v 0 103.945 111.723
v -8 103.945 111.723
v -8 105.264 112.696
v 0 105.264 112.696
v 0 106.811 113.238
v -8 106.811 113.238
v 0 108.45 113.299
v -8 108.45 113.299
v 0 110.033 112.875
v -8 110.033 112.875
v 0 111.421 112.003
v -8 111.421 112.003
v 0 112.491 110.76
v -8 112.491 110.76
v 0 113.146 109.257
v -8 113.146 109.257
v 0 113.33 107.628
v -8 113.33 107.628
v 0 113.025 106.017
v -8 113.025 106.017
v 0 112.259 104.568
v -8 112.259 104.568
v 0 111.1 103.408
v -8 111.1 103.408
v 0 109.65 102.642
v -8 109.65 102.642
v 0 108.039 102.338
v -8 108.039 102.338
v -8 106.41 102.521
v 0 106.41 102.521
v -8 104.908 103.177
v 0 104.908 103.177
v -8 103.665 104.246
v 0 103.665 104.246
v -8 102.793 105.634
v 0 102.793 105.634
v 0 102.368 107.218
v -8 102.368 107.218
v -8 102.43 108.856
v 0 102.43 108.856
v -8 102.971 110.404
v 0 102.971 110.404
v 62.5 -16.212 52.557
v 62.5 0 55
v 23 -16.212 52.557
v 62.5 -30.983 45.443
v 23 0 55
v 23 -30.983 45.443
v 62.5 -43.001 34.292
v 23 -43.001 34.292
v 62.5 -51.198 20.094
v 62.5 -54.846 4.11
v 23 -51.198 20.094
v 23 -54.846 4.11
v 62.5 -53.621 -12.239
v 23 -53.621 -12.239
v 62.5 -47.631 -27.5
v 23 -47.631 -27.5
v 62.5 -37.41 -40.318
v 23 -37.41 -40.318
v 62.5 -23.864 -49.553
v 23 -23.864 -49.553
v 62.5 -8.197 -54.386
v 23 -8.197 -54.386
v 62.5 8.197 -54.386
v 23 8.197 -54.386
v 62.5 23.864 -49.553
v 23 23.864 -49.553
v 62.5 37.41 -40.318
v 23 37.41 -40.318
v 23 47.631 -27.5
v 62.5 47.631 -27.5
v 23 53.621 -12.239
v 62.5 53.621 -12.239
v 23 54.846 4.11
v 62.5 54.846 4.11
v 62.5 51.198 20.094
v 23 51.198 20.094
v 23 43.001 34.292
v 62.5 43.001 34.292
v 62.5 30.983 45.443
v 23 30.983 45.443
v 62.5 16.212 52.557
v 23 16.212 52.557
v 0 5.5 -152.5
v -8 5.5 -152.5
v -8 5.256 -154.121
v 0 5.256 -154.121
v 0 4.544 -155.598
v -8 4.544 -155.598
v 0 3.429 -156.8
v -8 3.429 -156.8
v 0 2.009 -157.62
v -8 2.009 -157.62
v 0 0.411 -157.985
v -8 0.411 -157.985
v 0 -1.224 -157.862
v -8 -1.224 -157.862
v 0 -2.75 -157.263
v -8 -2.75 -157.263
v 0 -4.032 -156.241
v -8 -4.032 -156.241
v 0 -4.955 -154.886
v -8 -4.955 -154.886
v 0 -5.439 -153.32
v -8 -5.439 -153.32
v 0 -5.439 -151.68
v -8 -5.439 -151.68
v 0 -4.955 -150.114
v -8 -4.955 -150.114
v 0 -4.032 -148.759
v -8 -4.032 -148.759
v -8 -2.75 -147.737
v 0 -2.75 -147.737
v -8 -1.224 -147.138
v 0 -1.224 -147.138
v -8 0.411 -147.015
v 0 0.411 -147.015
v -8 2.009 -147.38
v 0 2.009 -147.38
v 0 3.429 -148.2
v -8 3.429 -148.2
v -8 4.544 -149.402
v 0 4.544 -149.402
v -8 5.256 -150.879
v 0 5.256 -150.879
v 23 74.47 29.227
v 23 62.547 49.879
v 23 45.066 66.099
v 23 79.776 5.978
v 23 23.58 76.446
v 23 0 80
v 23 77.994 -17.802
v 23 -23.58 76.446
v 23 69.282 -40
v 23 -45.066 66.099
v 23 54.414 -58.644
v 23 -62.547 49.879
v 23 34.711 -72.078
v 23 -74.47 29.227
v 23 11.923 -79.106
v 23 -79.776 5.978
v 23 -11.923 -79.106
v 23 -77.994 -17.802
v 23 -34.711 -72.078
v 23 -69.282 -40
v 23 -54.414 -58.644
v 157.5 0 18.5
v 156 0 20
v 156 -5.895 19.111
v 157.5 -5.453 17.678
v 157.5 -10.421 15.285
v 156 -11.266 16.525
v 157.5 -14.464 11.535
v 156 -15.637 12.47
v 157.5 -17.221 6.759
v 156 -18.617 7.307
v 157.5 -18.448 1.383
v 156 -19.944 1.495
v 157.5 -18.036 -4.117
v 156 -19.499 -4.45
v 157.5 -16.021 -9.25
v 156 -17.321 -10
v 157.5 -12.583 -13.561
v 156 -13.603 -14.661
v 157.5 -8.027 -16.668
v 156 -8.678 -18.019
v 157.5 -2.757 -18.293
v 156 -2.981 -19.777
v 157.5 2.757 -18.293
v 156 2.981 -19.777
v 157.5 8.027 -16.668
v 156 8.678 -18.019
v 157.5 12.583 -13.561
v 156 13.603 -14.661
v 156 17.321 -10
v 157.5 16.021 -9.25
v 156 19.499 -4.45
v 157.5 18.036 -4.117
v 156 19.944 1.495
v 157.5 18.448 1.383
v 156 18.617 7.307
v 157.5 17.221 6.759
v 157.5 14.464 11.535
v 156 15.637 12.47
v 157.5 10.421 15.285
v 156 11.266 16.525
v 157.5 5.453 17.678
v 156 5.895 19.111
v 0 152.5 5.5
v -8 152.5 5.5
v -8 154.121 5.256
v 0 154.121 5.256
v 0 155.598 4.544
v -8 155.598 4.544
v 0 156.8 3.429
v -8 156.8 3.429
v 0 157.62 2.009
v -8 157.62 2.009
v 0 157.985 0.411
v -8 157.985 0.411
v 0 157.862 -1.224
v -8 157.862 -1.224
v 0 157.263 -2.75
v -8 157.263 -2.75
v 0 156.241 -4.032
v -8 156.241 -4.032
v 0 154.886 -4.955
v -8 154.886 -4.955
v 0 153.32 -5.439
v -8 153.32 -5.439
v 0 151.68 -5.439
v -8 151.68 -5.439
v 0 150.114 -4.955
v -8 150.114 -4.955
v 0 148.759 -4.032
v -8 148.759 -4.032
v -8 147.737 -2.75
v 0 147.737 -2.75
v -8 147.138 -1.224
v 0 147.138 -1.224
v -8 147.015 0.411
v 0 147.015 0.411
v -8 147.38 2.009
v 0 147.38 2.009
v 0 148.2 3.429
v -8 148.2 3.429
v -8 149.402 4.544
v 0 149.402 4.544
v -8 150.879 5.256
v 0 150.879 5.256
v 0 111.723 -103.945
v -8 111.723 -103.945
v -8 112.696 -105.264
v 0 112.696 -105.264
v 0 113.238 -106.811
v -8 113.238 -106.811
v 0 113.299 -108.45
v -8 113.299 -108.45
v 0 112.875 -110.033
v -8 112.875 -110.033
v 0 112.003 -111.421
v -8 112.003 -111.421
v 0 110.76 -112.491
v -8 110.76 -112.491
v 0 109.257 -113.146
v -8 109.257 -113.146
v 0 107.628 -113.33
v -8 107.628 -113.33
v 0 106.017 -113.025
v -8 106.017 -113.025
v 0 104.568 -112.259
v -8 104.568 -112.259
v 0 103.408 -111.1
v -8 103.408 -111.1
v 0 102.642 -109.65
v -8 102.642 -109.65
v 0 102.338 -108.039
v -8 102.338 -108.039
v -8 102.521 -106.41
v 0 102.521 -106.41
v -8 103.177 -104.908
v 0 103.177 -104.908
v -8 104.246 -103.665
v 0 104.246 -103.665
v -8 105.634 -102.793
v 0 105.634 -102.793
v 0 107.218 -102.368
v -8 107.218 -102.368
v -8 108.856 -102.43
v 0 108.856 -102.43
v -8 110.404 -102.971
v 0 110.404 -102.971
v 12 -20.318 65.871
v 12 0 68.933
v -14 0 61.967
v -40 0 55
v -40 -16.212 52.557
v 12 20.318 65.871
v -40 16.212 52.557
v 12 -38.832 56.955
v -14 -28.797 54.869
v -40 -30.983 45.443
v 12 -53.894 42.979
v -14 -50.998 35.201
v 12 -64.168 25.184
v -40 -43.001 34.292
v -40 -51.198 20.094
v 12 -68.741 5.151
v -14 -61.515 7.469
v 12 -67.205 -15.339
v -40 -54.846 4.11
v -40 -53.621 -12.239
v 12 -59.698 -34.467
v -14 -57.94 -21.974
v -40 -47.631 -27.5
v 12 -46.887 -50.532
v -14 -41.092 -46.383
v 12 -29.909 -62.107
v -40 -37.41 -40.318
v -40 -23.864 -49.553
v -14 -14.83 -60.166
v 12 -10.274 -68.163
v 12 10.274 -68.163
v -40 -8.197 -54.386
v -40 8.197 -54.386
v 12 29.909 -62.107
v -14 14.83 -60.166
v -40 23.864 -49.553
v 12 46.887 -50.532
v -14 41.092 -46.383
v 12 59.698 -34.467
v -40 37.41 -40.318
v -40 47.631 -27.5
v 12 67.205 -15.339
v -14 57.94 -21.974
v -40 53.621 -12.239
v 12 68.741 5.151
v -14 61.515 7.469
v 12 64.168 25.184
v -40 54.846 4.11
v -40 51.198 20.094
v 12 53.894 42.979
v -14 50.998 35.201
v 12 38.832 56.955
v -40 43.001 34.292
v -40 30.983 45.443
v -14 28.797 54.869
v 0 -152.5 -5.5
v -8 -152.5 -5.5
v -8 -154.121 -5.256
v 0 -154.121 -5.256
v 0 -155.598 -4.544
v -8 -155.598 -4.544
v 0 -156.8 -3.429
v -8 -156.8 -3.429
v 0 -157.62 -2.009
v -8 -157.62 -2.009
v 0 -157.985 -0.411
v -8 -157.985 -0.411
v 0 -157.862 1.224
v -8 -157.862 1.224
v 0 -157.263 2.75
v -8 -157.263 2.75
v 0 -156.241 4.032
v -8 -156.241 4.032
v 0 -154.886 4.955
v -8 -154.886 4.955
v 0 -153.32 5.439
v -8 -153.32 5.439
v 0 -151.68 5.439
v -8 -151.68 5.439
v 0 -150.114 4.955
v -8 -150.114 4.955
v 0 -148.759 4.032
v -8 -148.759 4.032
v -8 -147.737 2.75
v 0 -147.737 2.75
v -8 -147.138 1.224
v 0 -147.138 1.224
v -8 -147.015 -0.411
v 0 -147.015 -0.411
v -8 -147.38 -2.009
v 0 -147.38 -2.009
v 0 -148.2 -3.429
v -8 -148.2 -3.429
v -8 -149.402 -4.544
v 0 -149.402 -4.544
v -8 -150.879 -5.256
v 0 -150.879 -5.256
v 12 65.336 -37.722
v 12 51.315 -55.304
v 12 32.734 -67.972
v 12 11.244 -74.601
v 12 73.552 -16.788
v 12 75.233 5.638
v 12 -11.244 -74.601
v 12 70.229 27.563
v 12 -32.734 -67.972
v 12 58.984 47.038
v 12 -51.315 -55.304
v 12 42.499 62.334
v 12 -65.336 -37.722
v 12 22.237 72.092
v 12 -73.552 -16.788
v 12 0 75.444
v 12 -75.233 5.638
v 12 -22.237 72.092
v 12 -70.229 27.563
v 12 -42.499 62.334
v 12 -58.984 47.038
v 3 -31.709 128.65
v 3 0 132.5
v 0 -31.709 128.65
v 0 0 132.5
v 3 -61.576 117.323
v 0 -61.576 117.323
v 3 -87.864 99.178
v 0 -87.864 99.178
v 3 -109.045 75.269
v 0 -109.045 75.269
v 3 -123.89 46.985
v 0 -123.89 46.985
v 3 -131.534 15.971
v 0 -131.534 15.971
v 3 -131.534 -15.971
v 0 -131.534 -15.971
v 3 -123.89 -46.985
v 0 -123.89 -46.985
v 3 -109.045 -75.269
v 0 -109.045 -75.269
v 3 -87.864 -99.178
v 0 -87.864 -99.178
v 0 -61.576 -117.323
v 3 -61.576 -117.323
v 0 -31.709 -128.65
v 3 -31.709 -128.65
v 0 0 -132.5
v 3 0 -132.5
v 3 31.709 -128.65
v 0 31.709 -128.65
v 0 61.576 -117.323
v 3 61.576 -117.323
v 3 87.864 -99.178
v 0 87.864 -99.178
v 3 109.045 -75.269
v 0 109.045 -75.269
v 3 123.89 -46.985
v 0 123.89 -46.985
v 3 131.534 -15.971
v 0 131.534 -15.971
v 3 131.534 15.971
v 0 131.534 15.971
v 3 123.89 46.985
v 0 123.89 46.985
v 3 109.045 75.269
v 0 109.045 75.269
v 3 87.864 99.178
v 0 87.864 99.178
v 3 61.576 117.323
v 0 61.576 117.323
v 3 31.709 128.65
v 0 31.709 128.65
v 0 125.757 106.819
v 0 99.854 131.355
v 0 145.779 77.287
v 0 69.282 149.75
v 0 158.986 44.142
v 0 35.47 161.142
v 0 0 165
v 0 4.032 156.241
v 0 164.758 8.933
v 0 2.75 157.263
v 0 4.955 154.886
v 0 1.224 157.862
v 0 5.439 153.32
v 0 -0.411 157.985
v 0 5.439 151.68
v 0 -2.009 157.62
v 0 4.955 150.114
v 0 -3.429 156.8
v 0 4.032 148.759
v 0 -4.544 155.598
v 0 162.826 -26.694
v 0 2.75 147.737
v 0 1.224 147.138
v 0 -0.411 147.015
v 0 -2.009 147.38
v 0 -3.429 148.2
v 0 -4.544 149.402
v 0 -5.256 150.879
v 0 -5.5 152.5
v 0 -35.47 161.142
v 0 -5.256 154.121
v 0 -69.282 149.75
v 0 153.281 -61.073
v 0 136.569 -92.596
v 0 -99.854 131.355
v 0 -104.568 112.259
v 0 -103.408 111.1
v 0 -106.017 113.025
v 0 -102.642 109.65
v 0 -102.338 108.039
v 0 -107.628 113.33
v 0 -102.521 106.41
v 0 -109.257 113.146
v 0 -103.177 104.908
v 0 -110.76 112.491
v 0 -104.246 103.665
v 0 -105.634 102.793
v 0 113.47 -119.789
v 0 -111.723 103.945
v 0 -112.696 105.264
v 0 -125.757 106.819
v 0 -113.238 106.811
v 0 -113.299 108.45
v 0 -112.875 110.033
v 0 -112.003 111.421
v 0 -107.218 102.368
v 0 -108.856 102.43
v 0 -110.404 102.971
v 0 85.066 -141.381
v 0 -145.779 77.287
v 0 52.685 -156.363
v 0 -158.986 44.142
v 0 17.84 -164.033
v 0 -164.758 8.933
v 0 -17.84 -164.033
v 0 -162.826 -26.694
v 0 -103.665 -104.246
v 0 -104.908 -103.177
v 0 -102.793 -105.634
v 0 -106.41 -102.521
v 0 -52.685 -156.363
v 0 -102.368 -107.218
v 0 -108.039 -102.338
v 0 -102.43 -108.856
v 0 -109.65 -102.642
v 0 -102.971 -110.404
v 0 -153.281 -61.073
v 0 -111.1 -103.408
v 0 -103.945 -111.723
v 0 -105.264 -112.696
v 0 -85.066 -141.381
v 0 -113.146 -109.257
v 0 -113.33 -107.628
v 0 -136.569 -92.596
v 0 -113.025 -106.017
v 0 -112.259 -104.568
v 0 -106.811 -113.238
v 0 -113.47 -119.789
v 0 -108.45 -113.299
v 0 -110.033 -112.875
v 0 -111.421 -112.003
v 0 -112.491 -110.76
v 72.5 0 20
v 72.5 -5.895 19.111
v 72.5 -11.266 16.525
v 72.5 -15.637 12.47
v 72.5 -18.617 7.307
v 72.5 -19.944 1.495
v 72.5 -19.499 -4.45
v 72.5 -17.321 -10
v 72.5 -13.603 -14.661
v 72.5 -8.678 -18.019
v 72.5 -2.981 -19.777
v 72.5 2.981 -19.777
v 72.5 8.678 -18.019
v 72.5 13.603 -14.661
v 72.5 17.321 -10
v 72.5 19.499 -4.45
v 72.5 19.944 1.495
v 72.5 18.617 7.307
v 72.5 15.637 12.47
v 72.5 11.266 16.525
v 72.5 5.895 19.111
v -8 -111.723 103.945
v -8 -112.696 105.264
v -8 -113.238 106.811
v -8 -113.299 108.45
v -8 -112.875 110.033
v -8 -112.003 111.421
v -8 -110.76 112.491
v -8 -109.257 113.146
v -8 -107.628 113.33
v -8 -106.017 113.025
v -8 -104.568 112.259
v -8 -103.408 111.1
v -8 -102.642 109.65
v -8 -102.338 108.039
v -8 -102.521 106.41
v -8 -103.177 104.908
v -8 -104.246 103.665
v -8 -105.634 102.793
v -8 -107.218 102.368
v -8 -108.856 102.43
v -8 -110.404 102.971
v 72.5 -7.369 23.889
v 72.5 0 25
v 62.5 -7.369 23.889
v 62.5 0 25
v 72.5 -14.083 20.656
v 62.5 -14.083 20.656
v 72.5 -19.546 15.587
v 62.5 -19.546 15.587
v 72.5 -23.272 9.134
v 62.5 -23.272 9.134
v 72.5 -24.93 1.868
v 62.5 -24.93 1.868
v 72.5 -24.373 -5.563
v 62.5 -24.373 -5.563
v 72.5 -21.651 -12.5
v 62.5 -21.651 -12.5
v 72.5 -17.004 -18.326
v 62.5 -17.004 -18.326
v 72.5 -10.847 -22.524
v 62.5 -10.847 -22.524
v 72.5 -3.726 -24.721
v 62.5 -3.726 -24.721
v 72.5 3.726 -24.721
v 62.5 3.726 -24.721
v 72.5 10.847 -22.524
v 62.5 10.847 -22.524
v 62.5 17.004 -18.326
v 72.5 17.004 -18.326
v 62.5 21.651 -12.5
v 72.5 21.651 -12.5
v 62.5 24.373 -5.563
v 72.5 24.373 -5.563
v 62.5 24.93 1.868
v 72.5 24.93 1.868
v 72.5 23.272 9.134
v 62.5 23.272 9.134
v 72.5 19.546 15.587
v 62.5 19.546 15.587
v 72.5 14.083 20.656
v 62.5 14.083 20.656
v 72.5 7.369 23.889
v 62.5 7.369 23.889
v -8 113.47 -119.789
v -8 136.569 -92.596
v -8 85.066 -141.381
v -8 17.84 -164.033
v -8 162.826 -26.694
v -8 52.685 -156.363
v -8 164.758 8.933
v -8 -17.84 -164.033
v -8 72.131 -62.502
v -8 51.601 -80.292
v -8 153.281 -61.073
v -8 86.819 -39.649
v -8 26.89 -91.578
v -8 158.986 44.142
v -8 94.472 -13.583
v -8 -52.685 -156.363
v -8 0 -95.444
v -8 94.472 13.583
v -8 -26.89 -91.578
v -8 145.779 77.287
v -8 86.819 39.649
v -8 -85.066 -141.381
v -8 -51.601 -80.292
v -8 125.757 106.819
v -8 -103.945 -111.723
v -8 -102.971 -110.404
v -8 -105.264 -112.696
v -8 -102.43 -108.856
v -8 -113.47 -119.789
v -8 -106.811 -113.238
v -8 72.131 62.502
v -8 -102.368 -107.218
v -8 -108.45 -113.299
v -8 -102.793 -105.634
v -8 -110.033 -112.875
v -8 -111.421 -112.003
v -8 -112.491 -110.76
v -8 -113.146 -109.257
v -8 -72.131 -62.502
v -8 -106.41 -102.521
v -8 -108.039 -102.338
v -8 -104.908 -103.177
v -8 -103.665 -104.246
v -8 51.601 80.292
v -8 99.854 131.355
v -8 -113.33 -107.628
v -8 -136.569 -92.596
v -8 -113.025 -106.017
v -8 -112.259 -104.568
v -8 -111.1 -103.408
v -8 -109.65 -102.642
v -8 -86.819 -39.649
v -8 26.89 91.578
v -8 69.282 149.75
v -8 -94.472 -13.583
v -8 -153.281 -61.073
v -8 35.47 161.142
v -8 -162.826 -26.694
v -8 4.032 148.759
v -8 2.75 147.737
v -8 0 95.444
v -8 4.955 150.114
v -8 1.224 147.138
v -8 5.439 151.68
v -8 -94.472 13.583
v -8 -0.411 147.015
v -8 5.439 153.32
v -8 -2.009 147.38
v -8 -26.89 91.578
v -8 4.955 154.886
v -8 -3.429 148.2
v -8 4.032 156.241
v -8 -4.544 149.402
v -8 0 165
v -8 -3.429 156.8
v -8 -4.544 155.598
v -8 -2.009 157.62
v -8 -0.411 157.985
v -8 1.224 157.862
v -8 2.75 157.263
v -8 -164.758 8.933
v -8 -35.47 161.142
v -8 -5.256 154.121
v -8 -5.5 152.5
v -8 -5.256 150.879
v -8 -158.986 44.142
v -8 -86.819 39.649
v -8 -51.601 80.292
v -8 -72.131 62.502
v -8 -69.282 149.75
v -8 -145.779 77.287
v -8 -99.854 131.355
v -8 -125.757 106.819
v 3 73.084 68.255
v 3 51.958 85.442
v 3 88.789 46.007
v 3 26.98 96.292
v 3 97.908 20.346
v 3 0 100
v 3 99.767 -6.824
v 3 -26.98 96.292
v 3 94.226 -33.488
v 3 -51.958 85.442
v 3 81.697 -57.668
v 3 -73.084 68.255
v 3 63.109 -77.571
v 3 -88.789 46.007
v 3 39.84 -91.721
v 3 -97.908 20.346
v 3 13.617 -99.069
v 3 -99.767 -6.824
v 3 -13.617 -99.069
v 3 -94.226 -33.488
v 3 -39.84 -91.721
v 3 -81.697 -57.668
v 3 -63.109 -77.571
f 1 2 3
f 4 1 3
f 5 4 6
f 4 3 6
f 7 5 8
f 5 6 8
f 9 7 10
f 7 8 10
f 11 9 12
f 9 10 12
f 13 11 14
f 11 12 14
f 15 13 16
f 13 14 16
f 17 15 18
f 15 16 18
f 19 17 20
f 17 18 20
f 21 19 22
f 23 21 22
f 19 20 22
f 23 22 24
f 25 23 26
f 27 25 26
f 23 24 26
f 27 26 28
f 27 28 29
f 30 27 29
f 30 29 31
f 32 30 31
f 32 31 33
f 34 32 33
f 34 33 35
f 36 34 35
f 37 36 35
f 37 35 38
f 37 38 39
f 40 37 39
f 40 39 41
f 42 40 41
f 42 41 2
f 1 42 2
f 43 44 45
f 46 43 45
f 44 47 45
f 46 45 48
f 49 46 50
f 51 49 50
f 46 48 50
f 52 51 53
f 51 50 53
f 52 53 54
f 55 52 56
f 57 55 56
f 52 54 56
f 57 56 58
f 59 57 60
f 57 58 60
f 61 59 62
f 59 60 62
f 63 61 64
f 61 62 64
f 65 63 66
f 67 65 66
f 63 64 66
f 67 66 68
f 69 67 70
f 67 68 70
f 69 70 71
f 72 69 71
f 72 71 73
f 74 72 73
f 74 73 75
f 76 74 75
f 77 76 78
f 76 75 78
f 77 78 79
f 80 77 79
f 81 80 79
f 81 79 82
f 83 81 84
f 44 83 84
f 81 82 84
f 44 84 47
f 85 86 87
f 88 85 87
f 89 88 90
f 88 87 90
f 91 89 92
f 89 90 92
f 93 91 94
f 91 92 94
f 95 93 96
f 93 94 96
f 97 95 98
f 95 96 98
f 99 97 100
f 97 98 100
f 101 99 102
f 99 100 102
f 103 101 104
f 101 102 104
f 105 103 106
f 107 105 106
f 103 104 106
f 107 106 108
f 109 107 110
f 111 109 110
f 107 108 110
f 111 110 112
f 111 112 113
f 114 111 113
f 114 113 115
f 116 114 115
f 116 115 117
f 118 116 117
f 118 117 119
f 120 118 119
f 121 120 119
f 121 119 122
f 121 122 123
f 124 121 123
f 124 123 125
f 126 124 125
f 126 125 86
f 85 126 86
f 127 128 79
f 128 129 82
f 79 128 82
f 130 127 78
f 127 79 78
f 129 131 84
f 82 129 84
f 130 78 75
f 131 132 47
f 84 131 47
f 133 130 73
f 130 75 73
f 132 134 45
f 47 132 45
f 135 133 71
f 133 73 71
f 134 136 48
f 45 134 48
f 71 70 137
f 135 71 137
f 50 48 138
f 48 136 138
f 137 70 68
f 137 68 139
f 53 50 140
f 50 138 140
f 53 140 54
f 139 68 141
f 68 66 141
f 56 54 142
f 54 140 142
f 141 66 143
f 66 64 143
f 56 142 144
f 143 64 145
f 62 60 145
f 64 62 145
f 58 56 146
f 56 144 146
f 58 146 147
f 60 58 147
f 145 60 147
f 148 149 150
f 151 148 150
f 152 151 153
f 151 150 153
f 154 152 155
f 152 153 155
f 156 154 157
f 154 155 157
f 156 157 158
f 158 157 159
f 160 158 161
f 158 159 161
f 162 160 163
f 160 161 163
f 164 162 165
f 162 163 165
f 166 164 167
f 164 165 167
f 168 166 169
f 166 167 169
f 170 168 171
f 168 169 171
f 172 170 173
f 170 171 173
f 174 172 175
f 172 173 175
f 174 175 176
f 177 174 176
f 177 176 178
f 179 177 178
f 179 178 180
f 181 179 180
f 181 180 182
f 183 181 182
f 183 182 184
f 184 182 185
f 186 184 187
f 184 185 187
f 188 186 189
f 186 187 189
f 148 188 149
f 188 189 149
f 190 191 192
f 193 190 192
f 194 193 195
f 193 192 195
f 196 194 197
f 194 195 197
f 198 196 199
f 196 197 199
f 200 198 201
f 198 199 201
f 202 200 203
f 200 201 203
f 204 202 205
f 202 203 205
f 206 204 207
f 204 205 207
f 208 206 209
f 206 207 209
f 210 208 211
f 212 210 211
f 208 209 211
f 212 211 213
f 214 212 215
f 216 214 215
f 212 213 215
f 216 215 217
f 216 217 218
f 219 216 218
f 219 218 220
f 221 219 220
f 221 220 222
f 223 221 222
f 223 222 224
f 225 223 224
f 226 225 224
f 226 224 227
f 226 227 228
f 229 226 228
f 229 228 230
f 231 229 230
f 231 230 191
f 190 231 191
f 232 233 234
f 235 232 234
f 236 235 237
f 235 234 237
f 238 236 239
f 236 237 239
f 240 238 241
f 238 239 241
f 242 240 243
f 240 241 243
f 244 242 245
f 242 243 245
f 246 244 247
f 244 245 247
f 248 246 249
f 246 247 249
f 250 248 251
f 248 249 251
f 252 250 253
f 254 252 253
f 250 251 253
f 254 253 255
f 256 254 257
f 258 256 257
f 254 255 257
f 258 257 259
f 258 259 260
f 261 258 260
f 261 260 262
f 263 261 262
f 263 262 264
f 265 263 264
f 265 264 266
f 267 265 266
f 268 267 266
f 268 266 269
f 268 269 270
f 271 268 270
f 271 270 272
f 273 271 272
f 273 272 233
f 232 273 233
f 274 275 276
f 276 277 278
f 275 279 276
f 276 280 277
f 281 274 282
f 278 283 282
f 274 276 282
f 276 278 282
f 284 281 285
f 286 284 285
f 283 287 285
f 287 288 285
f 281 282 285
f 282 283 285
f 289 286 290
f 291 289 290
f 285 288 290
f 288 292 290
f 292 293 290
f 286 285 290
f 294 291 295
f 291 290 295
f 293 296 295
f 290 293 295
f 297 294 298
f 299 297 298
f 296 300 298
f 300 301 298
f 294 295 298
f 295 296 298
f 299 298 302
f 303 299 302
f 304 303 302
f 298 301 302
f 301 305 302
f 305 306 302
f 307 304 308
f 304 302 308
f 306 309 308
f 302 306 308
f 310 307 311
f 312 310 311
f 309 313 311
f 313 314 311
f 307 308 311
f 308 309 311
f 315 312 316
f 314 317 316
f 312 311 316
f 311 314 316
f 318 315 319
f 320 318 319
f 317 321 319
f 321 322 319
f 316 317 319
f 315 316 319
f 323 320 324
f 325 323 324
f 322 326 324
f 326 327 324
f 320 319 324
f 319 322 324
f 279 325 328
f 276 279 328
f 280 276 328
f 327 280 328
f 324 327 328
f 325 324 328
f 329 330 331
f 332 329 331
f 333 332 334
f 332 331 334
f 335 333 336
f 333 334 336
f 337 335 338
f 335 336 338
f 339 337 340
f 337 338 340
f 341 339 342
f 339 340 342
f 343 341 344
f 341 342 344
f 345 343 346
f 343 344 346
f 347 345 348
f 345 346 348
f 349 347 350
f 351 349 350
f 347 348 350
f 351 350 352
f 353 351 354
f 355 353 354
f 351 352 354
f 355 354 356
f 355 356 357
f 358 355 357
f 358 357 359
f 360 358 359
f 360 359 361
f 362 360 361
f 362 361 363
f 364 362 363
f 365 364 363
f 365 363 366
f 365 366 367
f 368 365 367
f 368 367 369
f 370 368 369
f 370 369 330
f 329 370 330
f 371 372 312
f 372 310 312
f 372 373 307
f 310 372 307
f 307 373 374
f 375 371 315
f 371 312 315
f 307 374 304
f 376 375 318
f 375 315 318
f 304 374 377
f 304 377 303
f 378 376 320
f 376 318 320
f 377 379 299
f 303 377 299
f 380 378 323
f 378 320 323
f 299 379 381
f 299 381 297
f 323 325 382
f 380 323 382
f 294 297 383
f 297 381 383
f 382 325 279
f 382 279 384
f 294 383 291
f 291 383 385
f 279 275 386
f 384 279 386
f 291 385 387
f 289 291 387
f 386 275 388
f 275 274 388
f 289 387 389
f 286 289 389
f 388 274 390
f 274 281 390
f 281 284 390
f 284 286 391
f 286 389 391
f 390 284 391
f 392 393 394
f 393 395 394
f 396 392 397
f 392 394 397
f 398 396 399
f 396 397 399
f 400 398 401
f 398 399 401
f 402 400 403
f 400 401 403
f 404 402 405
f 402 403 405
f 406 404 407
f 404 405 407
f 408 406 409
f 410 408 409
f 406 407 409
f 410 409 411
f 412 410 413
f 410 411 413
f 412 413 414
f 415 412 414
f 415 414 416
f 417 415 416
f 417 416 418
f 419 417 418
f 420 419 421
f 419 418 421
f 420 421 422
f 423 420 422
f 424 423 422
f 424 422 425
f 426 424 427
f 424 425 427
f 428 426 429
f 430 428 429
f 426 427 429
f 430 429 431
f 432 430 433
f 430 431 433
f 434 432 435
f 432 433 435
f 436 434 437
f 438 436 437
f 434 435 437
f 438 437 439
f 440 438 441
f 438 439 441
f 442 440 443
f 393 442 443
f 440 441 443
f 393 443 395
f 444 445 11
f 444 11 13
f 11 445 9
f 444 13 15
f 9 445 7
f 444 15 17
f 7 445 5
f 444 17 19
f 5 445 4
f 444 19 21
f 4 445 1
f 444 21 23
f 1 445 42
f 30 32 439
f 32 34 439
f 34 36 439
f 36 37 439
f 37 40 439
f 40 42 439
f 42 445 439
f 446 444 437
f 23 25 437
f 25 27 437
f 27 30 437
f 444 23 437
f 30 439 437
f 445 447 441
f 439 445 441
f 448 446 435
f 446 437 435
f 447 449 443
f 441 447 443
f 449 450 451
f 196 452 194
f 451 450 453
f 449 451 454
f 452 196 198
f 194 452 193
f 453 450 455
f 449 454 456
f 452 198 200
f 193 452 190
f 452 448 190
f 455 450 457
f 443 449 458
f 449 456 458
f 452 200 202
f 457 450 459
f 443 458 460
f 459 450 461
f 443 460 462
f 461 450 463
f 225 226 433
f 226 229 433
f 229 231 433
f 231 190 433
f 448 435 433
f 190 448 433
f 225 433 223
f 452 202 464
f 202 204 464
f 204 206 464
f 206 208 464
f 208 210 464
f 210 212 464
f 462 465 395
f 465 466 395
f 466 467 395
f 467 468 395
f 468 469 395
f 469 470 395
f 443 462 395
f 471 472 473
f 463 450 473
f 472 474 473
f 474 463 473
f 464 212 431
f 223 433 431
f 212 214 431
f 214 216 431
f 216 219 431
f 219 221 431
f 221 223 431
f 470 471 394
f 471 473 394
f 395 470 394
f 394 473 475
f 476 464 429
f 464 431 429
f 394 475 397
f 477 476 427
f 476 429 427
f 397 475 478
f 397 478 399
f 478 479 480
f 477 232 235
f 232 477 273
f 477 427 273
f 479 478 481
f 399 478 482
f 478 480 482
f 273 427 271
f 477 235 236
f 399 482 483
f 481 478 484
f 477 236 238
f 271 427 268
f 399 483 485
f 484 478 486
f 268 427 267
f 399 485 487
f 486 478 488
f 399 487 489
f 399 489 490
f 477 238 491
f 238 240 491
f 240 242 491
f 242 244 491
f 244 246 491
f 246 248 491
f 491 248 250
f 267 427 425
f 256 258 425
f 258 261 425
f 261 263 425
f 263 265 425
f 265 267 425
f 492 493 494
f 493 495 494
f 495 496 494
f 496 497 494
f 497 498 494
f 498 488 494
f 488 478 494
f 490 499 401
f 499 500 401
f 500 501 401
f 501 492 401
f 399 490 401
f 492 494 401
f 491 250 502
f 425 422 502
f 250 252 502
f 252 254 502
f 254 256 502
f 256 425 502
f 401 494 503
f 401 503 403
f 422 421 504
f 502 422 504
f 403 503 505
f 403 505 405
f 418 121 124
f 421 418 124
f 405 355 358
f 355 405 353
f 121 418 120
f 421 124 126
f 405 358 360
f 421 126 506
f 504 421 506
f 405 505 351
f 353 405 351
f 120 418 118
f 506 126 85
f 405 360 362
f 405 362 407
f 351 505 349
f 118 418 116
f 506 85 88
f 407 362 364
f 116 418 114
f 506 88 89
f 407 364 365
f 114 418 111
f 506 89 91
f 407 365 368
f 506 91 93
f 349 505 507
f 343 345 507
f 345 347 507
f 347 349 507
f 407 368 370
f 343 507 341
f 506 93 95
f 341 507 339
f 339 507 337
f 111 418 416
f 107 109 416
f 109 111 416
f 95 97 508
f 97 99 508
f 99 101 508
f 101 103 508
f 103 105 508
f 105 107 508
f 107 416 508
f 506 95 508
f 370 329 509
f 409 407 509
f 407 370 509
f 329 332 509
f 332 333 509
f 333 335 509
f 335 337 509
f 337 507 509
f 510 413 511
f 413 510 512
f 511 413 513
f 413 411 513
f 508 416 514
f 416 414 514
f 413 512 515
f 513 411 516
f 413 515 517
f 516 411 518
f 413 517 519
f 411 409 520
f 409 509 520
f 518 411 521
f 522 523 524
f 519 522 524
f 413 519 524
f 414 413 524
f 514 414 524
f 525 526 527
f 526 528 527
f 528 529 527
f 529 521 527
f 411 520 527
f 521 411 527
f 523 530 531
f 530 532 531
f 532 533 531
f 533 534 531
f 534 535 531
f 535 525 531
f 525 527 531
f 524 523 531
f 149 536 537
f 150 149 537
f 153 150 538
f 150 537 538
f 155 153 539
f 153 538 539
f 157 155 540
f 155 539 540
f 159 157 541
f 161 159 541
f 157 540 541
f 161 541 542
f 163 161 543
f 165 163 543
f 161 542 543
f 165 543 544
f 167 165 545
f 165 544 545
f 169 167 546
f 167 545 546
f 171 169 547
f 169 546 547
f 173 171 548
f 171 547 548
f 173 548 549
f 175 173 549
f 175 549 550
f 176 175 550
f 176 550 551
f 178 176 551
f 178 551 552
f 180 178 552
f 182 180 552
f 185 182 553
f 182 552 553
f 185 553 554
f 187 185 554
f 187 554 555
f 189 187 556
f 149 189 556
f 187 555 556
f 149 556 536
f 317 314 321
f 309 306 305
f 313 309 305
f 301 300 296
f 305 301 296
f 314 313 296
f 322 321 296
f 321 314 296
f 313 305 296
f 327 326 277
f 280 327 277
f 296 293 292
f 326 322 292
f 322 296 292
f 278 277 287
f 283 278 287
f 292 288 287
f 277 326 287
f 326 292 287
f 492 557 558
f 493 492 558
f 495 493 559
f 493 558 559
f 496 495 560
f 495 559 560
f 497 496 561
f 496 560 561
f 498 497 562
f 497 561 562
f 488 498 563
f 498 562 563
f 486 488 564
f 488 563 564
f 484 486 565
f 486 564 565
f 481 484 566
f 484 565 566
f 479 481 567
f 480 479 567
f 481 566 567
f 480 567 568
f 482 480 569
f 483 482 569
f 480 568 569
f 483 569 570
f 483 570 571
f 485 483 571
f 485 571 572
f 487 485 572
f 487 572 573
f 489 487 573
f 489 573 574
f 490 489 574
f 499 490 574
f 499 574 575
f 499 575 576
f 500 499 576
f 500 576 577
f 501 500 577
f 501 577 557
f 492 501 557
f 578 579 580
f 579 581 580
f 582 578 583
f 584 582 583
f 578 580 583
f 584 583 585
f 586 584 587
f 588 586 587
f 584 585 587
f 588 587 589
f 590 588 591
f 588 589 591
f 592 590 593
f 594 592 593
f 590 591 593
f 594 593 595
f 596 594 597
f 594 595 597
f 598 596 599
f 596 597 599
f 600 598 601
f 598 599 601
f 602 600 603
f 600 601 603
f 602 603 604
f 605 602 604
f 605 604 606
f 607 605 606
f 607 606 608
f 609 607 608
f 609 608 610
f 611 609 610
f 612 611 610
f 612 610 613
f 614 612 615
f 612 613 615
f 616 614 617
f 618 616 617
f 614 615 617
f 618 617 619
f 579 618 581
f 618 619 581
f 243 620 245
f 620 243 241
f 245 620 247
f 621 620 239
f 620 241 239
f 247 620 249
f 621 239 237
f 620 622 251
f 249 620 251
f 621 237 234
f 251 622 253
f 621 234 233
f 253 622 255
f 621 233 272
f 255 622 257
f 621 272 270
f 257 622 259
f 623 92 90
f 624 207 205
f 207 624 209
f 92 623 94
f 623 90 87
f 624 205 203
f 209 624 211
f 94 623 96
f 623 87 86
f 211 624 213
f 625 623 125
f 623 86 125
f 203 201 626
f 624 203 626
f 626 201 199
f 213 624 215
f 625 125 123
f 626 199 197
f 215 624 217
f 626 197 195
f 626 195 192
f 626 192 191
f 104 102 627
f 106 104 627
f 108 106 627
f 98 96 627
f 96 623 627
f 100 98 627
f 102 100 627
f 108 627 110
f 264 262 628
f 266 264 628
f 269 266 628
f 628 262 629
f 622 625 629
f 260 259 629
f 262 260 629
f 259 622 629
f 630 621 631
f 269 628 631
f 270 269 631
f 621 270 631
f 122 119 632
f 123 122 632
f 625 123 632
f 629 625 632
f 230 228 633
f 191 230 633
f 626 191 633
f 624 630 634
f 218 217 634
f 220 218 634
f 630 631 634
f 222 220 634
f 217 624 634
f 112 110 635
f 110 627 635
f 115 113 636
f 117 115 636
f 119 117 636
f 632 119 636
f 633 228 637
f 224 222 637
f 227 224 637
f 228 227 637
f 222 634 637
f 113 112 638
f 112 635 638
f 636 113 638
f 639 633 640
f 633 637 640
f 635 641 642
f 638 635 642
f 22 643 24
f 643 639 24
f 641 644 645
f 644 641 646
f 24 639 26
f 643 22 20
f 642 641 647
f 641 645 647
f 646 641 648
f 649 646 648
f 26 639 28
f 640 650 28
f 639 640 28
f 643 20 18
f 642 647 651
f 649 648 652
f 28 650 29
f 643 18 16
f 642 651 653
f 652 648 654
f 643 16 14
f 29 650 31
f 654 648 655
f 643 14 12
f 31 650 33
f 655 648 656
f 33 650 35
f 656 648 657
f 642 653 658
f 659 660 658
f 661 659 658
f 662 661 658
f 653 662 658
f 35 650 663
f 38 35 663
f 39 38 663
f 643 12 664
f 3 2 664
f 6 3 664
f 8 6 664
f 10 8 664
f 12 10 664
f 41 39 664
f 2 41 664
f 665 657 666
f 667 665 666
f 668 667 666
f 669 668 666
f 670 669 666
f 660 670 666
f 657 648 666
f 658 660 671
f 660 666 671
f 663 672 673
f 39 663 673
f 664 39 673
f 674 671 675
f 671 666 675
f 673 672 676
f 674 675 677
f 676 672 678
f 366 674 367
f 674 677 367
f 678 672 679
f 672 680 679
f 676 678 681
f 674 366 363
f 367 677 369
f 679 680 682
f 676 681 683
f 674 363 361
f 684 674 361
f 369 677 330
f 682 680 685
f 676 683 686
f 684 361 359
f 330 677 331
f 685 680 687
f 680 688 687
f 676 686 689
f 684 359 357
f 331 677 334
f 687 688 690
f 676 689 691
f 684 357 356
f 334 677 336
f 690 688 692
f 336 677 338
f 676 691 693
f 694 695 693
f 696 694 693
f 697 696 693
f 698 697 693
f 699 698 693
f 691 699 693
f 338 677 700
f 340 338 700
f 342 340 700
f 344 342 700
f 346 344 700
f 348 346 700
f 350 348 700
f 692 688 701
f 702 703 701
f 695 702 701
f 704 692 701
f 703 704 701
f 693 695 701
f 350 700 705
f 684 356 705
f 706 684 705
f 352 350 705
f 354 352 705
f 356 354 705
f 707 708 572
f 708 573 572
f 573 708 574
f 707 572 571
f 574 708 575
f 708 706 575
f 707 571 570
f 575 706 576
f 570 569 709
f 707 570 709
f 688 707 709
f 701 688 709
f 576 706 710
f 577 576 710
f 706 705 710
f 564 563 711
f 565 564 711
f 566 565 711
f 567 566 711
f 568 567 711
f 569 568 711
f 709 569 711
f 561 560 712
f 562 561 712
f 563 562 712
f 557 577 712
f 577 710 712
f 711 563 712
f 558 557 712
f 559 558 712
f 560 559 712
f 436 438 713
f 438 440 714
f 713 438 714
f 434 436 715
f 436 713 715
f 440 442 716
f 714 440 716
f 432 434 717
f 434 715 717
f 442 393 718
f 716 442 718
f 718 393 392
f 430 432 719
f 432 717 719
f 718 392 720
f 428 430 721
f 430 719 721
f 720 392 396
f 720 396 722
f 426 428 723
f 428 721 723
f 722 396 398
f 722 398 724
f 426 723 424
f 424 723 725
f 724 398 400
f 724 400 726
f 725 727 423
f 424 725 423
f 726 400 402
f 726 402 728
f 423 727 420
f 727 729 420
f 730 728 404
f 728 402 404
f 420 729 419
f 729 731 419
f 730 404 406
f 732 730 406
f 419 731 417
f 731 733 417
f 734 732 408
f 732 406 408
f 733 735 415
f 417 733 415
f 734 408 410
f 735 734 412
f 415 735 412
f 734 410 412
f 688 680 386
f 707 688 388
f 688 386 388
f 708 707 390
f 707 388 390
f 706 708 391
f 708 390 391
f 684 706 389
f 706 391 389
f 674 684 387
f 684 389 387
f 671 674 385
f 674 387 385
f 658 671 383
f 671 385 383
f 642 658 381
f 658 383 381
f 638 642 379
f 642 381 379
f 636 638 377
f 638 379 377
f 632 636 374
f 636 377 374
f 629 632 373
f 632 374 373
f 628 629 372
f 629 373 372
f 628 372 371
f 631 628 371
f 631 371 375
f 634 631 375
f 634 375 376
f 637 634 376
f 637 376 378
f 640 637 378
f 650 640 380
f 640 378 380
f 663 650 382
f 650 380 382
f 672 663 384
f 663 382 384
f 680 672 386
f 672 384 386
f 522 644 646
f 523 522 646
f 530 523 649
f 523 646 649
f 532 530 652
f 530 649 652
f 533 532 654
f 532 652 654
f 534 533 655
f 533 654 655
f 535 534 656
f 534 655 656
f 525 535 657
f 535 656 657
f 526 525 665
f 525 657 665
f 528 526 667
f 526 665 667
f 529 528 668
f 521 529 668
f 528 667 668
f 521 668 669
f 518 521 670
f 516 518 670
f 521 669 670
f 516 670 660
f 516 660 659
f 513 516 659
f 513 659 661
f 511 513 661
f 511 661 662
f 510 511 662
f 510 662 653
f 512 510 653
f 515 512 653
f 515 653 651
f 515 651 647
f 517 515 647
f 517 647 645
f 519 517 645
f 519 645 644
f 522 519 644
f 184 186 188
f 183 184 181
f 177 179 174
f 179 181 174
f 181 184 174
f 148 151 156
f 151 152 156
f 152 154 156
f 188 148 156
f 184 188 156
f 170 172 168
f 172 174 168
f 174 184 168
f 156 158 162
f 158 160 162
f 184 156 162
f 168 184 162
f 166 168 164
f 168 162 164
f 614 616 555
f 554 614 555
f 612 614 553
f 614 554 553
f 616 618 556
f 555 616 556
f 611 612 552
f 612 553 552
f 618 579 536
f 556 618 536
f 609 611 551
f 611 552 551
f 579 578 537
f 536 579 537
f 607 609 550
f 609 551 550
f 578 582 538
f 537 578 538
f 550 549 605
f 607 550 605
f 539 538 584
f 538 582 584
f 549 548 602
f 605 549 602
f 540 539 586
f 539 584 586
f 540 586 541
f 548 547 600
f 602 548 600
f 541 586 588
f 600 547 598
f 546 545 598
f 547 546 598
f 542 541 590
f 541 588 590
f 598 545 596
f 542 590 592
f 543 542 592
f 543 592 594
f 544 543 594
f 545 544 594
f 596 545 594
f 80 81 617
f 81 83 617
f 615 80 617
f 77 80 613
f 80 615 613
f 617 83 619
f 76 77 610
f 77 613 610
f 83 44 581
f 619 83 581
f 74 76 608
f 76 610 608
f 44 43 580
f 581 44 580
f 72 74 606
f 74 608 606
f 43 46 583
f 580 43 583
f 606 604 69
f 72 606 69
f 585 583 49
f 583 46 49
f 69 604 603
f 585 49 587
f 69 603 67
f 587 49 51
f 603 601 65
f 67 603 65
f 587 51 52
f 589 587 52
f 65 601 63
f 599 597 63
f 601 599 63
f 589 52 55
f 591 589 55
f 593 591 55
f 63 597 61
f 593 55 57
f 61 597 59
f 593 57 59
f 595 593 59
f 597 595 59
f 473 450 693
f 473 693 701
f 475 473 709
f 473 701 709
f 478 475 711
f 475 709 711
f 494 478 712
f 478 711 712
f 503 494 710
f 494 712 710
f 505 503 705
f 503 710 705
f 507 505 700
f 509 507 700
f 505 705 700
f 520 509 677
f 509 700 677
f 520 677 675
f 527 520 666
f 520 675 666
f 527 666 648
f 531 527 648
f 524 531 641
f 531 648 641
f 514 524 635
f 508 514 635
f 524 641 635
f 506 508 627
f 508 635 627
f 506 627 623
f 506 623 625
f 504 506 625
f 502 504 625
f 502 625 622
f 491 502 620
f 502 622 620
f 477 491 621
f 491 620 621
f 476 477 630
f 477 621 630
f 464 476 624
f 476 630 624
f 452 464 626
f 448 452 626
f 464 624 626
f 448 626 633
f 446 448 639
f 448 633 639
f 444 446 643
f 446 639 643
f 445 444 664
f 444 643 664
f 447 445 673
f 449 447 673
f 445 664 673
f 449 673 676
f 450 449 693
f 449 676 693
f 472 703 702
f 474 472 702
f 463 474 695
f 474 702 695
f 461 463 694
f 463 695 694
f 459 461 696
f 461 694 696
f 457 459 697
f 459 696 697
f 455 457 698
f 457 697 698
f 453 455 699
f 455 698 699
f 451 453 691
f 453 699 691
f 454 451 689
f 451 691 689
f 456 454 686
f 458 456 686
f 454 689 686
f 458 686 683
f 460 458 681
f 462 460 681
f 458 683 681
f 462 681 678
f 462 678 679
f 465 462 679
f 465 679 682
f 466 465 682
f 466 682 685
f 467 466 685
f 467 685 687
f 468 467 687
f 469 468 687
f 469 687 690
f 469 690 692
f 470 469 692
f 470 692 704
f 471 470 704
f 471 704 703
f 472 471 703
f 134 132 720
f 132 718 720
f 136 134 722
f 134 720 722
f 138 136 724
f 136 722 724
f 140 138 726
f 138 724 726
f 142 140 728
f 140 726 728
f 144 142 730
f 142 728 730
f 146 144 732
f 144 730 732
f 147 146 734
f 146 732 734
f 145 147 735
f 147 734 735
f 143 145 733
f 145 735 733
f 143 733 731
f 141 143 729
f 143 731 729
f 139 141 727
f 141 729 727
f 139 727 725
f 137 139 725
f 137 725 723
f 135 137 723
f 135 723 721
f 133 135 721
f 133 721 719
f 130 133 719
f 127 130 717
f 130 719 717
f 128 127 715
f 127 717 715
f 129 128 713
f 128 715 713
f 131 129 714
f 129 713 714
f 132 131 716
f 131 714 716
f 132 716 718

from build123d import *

# Parameters (mm, degrees)
FASE1_SIZE                = 1.5
DURCHGANGSLOCH_F_R_M101_D = 11
KREISMUSTER1_COUNT        = 8


with BuildPart() as part:
    # Skizze3 → Rotation1 (revolve)
    with BuildSketch(Plane.XY, mode=Mode.PRIVATE) as rotation1_sk:
        Polygon((0, 132.5), (0, 165), (-8, 165), (-8, 95.443650814), (12, 75.443650814), (12, 68.933358006), (-40, 55), (-40, 0), (157.5, 0), (157.5, 20), (72.5, 20), (72.5, 25), (62.5, 25), (62.5, 55), (23, 55), (23, 80), (3, 100), (3, 132.5), align=None)
    revolve(rotation1_sk.sketch.rotate(Axis((-57.654973763, 0, 0), (1, 0, 0)), 90), axis=Axis((-57.654973763, 0, 0), (1, 0, 0)))

    # Fase1
    fase1_edges = [part.edges().sort_by_distance(p)[0] for p in [
        (157.5, 0, -20),
    ]]
    chamfer(fase1_edges, length=FASE1_SIZE)

    # Durchgangsloch für M101 (through all)
    with Locations(Plane(origin=(0, 0, 0), x_dir=(0, 0, -1), z_dir=(1, 0, 0))):
        with Locations((0, 152.5)):
            durchgangsloch_f_r_m101 = Hole(DURCHGANGSLOCH_F_R_M101_D / 2)

    # Kreismuster1: Durchgangsloch für M101 ×8 about axis
    kreismuster1_axis = Axis((0, 0, 0), (1, 0, 0))
    for i in range(1, KREISMUSTER1_COUNT):
        add(durchgangsloch_f_r_m101.rotate(kreismuster1_axis, i * 360 / KREISMUSTER1_COUNT), mode=Mode.SUBTRACT)


solid = part.part
